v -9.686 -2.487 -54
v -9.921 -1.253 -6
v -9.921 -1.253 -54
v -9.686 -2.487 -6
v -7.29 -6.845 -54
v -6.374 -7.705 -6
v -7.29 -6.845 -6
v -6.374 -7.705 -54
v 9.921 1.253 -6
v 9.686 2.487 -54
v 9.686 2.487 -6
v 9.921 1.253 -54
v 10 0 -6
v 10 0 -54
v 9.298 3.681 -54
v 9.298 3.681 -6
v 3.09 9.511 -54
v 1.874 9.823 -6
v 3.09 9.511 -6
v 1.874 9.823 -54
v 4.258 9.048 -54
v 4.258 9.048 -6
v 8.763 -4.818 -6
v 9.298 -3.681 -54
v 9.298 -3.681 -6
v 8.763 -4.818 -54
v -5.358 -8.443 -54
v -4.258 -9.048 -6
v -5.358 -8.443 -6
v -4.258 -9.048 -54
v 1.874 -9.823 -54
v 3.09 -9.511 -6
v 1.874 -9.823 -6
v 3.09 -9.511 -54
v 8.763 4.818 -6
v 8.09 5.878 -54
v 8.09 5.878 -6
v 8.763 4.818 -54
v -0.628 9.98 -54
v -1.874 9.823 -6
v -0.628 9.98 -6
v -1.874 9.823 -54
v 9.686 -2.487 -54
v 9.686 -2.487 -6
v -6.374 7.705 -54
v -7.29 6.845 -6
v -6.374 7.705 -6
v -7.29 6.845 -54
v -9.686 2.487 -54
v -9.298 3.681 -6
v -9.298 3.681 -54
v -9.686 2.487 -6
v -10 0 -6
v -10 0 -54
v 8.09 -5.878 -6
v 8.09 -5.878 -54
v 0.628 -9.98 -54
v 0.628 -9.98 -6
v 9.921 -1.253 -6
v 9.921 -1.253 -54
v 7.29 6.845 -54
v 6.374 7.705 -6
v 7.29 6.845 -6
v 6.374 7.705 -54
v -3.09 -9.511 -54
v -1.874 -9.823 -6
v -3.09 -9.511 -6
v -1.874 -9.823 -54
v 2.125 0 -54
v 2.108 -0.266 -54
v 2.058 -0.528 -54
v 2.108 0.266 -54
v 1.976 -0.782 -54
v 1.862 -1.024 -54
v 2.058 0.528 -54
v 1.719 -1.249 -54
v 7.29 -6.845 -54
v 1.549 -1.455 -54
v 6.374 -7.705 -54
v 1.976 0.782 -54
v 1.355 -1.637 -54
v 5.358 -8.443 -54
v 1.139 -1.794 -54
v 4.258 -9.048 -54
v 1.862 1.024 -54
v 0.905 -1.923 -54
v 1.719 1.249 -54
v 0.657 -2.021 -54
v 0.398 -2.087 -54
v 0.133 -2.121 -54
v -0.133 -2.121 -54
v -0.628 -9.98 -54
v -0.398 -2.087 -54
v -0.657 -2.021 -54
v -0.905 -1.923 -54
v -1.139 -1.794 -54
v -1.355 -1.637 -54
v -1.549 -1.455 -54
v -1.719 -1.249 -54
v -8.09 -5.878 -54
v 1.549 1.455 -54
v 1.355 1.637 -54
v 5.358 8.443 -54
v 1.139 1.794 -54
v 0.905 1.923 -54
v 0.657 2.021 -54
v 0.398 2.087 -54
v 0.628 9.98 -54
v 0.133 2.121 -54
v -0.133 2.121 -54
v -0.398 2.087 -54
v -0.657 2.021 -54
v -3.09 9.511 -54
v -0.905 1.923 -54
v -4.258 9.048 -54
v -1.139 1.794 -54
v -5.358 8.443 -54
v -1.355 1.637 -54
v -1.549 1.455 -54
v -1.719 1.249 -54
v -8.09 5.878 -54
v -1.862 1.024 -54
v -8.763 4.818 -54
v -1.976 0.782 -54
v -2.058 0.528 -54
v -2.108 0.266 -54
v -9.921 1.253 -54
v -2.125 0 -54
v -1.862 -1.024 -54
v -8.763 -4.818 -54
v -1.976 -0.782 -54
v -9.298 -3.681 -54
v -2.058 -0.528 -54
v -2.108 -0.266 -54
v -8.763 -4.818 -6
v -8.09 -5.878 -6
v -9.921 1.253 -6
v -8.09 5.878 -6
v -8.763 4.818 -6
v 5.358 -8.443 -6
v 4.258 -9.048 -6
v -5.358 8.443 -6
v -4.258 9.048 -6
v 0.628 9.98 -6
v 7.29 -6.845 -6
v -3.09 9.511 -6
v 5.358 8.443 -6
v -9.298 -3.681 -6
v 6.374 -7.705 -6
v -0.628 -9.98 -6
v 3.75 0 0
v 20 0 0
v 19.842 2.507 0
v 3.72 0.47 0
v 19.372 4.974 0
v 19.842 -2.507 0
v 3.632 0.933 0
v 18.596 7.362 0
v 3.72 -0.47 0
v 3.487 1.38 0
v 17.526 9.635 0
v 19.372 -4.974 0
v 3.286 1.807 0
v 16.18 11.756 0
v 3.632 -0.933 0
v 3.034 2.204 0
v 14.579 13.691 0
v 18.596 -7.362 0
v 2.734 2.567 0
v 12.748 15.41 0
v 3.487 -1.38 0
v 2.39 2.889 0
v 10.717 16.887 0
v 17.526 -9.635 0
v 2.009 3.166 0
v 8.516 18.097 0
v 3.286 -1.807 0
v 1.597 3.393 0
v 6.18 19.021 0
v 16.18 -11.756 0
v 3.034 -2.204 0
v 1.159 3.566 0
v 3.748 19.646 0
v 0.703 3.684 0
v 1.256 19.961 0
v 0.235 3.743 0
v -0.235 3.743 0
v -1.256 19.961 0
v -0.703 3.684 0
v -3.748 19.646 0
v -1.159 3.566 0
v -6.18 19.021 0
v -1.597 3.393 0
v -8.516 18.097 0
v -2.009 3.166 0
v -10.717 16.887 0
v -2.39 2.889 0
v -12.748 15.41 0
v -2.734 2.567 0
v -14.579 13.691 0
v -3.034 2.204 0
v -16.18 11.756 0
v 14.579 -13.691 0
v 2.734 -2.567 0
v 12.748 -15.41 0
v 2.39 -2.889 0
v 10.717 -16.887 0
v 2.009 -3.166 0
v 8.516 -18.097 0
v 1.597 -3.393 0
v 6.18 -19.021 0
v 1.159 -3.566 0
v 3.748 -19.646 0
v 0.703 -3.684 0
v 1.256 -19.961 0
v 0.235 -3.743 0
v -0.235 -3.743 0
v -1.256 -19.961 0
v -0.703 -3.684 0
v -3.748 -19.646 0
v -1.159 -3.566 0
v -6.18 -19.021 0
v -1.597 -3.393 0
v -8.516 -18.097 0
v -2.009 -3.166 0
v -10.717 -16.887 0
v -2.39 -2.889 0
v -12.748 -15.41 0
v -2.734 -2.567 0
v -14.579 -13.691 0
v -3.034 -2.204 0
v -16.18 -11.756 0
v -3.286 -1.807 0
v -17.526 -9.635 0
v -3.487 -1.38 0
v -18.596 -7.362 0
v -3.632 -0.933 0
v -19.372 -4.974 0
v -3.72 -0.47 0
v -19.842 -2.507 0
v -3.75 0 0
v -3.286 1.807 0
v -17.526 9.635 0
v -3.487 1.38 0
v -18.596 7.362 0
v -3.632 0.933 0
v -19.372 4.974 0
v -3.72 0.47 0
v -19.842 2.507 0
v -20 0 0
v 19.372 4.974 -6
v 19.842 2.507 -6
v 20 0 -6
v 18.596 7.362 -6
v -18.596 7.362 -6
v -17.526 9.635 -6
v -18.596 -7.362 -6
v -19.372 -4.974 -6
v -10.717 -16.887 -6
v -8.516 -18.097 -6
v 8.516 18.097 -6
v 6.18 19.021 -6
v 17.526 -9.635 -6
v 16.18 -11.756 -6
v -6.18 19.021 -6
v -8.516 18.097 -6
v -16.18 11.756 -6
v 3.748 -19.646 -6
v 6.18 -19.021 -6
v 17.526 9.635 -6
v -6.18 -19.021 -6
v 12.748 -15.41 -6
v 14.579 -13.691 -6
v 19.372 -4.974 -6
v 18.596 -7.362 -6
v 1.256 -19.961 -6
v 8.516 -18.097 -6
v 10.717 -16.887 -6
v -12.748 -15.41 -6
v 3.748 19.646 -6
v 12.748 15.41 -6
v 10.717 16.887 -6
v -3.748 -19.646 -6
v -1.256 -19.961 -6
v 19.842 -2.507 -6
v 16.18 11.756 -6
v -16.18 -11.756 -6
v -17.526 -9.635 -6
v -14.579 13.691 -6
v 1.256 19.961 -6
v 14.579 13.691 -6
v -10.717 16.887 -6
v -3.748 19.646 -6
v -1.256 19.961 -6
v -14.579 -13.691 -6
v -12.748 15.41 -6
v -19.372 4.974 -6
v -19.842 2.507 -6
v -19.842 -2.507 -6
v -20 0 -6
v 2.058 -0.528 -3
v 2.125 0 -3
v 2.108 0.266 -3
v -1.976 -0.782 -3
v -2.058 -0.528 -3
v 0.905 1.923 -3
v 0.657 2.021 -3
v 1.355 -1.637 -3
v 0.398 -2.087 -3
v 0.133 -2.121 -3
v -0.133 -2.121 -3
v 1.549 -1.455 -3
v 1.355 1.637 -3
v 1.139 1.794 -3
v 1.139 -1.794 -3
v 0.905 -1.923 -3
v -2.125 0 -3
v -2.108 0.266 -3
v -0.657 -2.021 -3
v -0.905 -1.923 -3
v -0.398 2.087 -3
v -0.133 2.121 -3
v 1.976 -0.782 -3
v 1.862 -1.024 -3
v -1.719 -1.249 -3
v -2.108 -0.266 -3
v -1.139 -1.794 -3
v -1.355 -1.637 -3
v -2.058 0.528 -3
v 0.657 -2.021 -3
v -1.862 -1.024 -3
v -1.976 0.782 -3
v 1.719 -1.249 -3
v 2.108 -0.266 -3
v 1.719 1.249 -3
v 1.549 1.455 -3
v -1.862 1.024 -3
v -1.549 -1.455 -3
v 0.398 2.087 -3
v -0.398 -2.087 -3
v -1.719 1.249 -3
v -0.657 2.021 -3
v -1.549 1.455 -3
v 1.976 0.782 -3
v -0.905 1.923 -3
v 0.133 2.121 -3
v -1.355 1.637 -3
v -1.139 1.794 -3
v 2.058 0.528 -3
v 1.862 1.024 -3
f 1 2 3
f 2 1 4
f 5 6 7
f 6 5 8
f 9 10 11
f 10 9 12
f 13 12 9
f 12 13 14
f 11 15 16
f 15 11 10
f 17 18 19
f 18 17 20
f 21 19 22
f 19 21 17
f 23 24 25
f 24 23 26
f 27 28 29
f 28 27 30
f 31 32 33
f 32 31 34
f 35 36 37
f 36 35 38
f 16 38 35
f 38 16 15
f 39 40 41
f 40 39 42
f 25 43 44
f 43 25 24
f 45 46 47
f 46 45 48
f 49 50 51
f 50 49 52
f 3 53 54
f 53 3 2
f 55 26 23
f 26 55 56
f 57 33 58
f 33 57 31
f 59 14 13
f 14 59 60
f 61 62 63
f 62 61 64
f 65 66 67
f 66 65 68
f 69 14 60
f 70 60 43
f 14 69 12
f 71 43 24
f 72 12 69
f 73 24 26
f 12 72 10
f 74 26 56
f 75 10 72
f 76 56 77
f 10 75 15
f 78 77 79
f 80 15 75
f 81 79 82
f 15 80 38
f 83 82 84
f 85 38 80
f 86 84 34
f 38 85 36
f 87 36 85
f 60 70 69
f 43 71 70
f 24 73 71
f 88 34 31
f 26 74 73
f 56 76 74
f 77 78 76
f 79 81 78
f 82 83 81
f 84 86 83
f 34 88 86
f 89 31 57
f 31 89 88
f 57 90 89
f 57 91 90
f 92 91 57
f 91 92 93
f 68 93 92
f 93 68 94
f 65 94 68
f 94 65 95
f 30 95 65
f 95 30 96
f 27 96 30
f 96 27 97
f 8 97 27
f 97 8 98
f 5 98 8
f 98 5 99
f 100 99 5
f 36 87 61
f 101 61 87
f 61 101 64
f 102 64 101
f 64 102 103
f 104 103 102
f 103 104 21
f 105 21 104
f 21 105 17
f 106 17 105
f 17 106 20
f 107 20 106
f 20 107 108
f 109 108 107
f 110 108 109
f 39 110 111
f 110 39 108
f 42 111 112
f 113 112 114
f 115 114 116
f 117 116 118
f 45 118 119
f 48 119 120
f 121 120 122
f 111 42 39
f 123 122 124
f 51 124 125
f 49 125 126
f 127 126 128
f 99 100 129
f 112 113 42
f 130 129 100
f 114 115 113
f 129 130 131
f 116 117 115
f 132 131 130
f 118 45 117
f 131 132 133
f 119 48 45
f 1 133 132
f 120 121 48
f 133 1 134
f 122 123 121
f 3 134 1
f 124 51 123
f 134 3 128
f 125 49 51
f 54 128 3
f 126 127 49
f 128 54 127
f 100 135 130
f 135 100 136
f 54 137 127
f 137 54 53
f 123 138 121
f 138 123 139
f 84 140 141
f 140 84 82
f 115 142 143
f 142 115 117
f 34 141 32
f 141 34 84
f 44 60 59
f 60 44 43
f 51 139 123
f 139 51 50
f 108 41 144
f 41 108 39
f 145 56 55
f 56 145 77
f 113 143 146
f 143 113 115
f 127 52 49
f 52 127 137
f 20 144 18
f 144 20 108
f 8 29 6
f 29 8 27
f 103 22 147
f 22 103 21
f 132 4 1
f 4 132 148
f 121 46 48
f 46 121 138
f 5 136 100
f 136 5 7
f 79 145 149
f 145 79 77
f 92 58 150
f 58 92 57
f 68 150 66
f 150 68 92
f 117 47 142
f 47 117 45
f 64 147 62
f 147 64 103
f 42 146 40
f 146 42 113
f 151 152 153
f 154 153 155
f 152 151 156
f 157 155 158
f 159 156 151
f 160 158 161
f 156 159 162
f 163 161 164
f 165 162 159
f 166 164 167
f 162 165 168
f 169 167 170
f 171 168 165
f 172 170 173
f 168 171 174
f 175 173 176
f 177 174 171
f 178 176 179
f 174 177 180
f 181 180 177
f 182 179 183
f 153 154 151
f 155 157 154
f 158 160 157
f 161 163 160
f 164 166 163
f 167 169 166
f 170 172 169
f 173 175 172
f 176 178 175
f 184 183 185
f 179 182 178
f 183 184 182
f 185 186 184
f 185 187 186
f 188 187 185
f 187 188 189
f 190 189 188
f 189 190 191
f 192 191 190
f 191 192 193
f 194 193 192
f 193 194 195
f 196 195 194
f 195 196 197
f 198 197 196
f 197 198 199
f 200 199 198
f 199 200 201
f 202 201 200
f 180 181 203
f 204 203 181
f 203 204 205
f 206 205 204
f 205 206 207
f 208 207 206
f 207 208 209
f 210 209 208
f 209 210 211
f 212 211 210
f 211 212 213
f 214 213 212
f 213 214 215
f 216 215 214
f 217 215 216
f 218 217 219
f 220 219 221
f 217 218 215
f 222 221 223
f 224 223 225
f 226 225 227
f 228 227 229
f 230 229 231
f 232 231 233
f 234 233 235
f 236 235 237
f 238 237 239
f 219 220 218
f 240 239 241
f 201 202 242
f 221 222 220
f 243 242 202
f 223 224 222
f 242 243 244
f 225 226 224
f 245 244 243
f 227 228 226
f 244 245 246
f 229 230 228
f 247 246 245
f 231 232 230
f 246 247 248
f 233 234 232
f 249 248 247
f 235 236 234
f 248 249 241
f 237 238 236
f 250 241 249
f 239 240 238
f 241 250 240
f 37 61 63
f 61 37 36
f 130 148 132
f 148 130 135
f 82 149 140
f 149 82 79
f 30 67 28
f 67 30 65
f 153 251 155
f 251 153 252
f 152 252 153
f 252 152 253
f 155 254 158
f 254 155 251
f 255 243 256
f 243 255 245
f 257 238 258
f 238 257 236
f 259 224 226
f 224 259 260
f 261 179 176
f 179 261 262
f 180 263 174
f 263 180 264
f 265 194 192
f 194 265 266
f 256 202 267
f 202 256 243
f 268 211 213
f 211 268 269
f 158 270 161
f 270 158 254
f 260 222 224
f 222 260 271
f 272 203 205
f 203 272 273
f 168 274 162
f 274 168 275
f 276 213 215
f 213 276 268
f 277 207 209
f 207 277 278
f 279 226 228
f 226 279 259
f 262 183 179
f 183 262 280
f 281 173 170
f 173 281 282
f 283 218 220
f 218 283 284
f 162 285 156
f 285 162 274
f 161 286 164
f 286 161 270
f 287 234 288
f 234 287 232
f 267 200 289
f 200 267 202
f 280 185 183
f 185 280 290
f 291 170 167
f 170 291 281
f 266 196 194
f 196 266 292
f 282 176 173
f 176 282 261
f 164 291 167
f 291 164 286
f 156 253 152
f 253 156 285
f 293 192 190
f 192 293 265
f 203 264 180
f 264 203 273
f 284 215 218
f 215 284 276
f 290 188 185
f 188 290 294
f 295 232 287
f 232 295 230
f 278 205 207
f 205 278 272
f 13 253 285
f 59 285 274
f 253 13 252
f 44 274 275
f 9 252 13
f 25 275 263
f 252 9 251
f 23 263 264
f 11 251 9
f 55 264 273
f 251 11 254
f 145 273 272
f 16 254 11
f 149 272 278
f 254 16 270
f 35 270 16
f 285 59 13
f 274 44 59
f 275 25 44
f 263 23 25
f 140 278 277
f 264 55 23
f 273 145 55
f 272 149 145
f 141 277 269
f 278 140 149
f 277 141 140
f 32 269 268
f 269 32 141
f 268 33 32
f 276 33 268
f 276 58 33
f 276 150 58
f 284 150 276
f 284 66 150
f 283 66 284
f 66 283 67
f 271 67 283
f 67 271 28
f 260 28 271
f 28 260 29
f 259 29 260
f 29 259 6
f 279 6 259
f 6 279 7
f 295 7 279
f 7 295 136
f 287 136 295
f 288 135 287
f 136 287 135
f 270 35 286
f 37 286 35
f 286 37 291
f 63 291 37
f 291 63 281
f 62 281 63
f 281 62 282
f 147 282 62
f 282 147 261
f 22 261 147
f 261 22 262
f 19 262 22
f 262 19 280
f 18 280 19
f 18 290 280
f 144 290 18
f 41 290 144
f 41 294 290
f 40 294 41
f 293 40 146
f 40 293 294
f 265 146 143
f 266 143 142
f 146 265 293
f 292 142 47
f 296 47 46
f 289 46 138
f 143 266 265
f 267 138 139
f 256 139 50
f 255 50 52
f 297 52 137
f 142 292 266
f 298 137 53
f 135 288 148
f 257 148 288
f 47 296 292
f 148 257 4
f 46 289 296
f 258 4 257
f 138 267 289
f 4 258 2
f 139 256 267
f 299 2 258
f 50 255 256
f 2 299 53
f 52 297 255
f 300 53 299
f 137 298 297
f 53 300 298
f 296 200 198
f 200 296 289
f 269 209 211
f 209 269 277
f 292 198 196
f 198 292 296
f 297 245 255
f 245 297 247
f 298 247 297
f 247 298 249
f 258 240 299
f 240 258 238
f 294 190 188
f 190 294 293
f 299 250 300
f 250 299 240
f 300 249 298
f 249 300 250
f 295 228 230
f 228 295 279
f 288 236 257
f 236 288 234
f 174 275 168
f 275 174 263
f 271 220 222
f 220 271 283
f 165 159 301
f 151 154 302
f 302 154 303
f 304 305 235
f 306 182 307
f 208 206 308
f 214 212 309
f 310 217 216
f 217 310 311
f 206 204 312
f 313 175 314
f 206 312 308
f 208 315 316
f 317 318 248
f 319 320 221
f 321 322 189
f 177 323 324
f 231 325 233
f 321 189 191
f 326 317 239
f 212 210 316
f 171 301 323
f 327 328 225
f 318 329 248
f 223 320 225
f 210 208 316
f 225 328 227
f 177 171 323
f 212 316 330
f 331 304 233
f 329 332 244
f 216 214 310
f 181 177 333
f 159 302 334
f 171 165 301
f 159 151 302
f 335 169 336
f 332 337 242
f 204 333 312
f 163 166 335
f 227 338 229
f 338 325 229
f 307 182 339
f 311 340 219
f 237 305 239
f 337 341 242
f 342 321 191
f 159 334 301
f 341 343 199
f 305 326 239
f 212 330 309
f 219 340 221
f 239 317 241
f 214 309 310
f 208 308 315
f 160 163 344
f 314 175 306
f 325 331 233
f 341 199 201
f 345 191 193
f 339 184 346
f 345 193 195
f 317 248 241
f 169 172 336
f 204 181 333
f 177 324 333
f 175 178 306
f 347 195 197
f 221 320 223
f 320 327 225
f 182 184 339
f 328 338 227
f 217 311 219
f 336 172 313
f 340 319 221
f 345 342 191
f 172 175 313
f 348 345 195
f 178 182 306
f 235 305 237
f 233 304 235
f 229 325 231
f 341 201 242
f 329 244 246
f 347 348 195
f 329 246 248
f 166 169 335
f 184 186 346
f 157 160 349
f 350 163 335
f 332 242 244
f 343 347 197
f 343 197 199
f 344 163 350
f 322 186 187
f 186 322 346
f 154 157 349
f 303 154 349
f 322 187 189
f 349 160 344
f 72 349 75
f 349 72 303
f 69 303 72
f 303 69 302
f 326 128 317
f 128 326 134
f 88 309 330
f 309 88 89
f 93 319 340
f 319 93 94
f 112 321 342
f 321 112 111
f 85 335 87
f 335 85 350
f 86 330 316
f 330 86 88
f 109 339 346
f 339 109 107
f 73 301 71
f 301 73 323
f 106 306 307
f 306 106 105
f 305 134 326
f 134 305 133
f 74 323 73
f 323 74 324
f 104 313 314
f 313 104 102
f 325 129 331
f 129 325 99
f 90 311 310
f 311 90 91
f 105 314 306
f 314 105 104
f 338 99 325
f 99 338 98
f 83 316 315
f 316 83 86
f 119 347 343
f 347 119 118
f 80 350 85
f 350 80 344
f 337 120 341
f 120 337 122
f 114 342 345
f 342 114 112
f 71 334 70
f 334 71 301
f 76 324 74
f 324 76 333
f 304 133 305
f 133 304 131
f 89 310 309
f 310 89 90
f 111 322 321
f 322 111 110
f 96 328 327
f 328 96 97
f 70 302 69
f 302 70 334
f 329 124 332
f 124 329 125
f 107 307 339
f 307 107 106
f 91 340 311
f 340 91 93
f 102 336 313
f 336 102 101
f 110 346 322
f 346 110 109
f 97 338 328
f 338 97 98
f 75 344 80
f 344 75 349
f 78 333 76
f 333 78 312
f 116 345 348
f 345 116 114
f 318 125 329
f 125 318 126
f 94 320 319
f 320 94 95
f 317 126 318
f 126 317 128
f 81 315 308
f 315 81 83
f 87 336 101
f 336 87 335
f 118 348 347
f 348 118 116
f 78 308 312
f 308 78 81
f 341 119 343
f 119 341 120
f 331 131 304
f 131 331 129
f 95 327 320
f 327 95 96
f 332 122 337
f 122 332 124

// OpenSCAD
$fn = 50;


difference() {
	union() {
		translate(v = [0, 0, -54.0000000000]) {
			cylinder(h = 54, r = 10.0000000000);
		}
		translate(v = [0, 0, -6.0000000000]) {
			cylinder(h = 6, r = 20.0000000000);
		}
	}
	union() {
		translate(v = [0, 0, 0]) {
			rotate(a = [0, 0, 0]) {
				difference() {
					union() {
						#translate(v = [0, 0, -54.0000000000]) {
							cylinder(h = 54, r = 2.0000000000);
						}
						#translate(v = [0, 0, -3]) {
							cylinder(h = 3, r = 10.0000000000, r1 = 2.1250000000, r2 = 3.7500000000);
						}
						#translate(v = [0, 0, -54.0000000000]) {
							cylinder(h = 54, r = 2.1250000000);
						}
						#translate(v = [0, 0, -54.0000000000]) {
							cylinder(h = 54, r = 2.0000000000);
						}
					}
					union();
				}
			}
		}
	}
}
